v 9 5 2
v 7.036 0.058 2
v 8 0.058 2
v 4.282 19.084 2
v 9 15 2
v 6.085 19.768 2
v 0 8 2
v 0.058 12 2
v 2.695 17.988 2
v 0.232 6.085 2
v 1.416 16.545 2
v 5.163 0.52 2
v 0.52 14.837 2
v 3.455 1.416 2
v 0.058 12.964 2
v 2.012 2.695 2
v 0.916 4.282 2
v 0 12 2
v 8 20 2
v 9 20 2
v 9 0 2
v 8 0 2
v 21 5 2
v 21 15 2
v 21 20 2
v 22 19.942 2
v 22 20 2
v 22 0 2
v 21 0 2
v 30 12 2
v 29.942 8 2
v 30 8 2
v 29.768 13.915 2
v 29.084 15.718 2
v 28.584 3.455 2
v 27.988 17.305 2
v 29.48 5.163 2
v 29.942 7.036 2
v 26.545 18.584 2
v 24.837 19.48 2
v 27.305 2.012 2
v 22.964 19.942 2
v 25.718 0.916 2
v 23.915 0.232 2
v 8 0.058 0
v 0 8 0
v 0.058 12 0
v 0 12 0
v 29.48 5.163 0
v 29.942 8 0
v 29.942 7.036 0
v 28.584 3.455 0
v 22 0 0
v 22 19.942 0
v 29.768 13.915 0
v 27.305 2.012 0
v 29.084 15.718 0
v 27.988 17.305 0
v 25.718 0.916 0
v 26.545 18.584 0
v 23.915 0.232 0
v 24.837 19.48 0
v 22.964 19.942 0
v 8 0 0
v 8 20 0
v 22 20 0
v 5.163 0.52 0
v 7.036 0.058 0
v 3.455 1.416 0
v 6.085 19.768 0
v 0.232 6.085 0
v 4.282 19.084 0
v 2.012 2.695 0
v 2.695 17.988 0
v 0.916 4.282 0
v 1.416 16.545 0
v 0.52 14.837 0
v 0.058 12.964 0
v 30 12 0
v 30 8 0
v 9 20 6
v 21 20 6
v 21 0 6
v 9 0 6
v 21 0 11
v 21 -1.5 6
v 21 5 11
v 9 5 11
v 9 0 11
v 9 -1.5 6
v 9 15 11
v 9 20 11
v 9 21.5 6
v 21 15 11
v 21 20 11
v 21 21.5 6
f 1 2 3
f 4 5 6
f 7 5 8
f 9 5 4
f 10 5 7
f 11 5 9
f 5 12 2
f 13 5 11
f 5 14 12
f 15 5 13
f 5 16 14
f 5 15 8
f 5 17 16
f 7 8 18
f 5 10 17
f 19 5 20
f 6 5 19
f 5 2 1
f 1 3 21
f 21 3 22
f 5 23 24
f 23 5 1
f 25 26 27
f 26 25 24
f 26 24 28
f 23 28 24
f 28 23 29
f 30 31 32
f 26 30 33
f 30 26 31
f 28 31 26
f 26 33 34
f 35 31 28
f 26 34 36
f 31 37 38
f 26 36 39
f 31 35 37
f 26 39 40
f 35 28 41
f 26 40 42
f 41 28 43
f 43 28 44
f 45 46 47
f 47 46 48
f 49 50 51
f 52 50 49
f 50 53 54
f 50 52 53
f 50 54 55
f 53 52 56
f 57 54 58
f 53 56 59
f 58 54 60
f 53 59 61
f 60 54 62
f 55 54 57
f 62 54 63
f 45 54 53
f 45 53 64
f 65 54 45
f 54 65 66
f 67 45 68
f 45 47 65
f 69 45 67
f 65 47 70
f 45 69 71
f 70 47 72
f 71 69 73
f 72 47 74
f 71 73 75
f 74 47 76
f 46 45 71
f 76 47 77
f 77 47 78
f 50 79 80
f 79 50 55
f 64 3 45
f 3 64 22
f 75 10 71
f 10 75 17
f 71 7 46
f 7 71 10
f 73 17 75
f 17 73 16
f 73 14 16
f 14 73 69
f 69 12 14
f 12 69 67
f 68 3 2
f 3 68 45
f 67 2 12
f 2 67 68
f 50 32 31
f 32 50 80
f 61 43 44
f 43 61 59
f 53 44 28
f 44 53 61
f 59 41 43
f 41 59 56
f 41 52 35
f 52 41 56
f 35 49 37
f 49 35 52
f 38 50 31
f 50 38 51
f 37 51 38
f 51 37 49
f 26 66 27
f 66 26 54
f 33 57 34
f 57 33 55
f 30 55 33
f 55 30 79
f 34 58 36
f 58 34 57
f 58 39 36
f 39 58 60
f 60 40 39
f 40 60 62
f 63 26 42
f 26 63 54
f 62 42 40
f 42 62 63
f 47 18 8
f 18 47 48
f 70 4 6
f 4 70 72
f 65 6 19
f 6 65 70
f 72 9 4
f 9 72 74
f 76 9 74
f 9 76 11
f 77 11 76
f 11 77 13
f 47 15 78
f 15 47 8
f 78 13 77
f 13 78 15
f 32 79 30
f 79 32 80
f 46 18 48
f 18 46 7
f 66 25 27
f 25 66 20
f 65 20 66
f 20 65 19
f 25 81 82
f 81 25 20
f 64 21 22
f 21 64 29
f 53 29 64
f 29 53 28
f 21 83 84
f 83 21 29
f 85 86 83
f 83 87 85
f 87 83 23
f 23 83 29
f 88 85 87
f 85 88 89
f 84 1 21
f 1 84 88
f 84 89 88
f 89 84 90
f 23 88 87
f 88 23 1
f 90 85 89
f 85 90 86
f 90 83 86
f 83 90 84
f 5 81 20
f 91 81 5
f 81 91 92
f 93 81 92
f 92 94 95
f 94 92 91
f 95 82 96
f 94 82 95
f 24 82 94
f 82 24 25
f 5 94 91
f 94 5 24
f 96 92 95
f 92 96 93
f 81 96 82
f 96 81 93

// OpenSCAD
// file: simple_rounded_cube.scad
module sr_cube(size=[1,1,1],radius=0.5) {
    difference(){    
    cube(size);
    
        translate([radius,radius,0])rotate([0,0,180])difference(){
                cube([radius*2,radius*2,size[2]]);
                cylinder(size[2],radius,radius);
        }
        translate([size[0]-radius,radius,0])rotate([0,0,270])difference(){
                cube([radius*2,radius*2,size[2]]);
                cylinder(size[2],radius,radius);
        }
        translate([size[0]-radius,size[1]-radius,0])rotate([0,0,0])difference(){
                cube([radius*2,radius*2,size[2]]);
                cylinder(size[2],radius,radius);
        }
        translate([radius,size[1]-radius,0])rotate([0,0,90])difference(){
                cube([radius*2,radius*2,size[2]]);
                cylinder(size[2],radius,radius);
        }
        }
        
}
// main file
l = 30;
w = 20;

//clip size
c_h = 9;
c_l = 12;
c_w = 5;
c_d = 20;

//hook size
h_h = 5;
h_w = 1.5;

//strength
s = 2;
//radius
r = 8;

include<simple_rounded_cube.scad>

module hook(){
    cube([c_l,c_w,c_h]);
    translate([0,0,c_h-h_h])  rotate([0,270,180]) linear_extrude(c_l) polygon([[0,0],[h_h,0],[0,h_w]]);
    
    }


sr_cube([l,w,s],r);


translate([(l-c_l)/2,(w-c_d)/2,s]) {
    hook();
    translate([c_l,c_d,0]) rotate([0,0,180]) hook();
}
